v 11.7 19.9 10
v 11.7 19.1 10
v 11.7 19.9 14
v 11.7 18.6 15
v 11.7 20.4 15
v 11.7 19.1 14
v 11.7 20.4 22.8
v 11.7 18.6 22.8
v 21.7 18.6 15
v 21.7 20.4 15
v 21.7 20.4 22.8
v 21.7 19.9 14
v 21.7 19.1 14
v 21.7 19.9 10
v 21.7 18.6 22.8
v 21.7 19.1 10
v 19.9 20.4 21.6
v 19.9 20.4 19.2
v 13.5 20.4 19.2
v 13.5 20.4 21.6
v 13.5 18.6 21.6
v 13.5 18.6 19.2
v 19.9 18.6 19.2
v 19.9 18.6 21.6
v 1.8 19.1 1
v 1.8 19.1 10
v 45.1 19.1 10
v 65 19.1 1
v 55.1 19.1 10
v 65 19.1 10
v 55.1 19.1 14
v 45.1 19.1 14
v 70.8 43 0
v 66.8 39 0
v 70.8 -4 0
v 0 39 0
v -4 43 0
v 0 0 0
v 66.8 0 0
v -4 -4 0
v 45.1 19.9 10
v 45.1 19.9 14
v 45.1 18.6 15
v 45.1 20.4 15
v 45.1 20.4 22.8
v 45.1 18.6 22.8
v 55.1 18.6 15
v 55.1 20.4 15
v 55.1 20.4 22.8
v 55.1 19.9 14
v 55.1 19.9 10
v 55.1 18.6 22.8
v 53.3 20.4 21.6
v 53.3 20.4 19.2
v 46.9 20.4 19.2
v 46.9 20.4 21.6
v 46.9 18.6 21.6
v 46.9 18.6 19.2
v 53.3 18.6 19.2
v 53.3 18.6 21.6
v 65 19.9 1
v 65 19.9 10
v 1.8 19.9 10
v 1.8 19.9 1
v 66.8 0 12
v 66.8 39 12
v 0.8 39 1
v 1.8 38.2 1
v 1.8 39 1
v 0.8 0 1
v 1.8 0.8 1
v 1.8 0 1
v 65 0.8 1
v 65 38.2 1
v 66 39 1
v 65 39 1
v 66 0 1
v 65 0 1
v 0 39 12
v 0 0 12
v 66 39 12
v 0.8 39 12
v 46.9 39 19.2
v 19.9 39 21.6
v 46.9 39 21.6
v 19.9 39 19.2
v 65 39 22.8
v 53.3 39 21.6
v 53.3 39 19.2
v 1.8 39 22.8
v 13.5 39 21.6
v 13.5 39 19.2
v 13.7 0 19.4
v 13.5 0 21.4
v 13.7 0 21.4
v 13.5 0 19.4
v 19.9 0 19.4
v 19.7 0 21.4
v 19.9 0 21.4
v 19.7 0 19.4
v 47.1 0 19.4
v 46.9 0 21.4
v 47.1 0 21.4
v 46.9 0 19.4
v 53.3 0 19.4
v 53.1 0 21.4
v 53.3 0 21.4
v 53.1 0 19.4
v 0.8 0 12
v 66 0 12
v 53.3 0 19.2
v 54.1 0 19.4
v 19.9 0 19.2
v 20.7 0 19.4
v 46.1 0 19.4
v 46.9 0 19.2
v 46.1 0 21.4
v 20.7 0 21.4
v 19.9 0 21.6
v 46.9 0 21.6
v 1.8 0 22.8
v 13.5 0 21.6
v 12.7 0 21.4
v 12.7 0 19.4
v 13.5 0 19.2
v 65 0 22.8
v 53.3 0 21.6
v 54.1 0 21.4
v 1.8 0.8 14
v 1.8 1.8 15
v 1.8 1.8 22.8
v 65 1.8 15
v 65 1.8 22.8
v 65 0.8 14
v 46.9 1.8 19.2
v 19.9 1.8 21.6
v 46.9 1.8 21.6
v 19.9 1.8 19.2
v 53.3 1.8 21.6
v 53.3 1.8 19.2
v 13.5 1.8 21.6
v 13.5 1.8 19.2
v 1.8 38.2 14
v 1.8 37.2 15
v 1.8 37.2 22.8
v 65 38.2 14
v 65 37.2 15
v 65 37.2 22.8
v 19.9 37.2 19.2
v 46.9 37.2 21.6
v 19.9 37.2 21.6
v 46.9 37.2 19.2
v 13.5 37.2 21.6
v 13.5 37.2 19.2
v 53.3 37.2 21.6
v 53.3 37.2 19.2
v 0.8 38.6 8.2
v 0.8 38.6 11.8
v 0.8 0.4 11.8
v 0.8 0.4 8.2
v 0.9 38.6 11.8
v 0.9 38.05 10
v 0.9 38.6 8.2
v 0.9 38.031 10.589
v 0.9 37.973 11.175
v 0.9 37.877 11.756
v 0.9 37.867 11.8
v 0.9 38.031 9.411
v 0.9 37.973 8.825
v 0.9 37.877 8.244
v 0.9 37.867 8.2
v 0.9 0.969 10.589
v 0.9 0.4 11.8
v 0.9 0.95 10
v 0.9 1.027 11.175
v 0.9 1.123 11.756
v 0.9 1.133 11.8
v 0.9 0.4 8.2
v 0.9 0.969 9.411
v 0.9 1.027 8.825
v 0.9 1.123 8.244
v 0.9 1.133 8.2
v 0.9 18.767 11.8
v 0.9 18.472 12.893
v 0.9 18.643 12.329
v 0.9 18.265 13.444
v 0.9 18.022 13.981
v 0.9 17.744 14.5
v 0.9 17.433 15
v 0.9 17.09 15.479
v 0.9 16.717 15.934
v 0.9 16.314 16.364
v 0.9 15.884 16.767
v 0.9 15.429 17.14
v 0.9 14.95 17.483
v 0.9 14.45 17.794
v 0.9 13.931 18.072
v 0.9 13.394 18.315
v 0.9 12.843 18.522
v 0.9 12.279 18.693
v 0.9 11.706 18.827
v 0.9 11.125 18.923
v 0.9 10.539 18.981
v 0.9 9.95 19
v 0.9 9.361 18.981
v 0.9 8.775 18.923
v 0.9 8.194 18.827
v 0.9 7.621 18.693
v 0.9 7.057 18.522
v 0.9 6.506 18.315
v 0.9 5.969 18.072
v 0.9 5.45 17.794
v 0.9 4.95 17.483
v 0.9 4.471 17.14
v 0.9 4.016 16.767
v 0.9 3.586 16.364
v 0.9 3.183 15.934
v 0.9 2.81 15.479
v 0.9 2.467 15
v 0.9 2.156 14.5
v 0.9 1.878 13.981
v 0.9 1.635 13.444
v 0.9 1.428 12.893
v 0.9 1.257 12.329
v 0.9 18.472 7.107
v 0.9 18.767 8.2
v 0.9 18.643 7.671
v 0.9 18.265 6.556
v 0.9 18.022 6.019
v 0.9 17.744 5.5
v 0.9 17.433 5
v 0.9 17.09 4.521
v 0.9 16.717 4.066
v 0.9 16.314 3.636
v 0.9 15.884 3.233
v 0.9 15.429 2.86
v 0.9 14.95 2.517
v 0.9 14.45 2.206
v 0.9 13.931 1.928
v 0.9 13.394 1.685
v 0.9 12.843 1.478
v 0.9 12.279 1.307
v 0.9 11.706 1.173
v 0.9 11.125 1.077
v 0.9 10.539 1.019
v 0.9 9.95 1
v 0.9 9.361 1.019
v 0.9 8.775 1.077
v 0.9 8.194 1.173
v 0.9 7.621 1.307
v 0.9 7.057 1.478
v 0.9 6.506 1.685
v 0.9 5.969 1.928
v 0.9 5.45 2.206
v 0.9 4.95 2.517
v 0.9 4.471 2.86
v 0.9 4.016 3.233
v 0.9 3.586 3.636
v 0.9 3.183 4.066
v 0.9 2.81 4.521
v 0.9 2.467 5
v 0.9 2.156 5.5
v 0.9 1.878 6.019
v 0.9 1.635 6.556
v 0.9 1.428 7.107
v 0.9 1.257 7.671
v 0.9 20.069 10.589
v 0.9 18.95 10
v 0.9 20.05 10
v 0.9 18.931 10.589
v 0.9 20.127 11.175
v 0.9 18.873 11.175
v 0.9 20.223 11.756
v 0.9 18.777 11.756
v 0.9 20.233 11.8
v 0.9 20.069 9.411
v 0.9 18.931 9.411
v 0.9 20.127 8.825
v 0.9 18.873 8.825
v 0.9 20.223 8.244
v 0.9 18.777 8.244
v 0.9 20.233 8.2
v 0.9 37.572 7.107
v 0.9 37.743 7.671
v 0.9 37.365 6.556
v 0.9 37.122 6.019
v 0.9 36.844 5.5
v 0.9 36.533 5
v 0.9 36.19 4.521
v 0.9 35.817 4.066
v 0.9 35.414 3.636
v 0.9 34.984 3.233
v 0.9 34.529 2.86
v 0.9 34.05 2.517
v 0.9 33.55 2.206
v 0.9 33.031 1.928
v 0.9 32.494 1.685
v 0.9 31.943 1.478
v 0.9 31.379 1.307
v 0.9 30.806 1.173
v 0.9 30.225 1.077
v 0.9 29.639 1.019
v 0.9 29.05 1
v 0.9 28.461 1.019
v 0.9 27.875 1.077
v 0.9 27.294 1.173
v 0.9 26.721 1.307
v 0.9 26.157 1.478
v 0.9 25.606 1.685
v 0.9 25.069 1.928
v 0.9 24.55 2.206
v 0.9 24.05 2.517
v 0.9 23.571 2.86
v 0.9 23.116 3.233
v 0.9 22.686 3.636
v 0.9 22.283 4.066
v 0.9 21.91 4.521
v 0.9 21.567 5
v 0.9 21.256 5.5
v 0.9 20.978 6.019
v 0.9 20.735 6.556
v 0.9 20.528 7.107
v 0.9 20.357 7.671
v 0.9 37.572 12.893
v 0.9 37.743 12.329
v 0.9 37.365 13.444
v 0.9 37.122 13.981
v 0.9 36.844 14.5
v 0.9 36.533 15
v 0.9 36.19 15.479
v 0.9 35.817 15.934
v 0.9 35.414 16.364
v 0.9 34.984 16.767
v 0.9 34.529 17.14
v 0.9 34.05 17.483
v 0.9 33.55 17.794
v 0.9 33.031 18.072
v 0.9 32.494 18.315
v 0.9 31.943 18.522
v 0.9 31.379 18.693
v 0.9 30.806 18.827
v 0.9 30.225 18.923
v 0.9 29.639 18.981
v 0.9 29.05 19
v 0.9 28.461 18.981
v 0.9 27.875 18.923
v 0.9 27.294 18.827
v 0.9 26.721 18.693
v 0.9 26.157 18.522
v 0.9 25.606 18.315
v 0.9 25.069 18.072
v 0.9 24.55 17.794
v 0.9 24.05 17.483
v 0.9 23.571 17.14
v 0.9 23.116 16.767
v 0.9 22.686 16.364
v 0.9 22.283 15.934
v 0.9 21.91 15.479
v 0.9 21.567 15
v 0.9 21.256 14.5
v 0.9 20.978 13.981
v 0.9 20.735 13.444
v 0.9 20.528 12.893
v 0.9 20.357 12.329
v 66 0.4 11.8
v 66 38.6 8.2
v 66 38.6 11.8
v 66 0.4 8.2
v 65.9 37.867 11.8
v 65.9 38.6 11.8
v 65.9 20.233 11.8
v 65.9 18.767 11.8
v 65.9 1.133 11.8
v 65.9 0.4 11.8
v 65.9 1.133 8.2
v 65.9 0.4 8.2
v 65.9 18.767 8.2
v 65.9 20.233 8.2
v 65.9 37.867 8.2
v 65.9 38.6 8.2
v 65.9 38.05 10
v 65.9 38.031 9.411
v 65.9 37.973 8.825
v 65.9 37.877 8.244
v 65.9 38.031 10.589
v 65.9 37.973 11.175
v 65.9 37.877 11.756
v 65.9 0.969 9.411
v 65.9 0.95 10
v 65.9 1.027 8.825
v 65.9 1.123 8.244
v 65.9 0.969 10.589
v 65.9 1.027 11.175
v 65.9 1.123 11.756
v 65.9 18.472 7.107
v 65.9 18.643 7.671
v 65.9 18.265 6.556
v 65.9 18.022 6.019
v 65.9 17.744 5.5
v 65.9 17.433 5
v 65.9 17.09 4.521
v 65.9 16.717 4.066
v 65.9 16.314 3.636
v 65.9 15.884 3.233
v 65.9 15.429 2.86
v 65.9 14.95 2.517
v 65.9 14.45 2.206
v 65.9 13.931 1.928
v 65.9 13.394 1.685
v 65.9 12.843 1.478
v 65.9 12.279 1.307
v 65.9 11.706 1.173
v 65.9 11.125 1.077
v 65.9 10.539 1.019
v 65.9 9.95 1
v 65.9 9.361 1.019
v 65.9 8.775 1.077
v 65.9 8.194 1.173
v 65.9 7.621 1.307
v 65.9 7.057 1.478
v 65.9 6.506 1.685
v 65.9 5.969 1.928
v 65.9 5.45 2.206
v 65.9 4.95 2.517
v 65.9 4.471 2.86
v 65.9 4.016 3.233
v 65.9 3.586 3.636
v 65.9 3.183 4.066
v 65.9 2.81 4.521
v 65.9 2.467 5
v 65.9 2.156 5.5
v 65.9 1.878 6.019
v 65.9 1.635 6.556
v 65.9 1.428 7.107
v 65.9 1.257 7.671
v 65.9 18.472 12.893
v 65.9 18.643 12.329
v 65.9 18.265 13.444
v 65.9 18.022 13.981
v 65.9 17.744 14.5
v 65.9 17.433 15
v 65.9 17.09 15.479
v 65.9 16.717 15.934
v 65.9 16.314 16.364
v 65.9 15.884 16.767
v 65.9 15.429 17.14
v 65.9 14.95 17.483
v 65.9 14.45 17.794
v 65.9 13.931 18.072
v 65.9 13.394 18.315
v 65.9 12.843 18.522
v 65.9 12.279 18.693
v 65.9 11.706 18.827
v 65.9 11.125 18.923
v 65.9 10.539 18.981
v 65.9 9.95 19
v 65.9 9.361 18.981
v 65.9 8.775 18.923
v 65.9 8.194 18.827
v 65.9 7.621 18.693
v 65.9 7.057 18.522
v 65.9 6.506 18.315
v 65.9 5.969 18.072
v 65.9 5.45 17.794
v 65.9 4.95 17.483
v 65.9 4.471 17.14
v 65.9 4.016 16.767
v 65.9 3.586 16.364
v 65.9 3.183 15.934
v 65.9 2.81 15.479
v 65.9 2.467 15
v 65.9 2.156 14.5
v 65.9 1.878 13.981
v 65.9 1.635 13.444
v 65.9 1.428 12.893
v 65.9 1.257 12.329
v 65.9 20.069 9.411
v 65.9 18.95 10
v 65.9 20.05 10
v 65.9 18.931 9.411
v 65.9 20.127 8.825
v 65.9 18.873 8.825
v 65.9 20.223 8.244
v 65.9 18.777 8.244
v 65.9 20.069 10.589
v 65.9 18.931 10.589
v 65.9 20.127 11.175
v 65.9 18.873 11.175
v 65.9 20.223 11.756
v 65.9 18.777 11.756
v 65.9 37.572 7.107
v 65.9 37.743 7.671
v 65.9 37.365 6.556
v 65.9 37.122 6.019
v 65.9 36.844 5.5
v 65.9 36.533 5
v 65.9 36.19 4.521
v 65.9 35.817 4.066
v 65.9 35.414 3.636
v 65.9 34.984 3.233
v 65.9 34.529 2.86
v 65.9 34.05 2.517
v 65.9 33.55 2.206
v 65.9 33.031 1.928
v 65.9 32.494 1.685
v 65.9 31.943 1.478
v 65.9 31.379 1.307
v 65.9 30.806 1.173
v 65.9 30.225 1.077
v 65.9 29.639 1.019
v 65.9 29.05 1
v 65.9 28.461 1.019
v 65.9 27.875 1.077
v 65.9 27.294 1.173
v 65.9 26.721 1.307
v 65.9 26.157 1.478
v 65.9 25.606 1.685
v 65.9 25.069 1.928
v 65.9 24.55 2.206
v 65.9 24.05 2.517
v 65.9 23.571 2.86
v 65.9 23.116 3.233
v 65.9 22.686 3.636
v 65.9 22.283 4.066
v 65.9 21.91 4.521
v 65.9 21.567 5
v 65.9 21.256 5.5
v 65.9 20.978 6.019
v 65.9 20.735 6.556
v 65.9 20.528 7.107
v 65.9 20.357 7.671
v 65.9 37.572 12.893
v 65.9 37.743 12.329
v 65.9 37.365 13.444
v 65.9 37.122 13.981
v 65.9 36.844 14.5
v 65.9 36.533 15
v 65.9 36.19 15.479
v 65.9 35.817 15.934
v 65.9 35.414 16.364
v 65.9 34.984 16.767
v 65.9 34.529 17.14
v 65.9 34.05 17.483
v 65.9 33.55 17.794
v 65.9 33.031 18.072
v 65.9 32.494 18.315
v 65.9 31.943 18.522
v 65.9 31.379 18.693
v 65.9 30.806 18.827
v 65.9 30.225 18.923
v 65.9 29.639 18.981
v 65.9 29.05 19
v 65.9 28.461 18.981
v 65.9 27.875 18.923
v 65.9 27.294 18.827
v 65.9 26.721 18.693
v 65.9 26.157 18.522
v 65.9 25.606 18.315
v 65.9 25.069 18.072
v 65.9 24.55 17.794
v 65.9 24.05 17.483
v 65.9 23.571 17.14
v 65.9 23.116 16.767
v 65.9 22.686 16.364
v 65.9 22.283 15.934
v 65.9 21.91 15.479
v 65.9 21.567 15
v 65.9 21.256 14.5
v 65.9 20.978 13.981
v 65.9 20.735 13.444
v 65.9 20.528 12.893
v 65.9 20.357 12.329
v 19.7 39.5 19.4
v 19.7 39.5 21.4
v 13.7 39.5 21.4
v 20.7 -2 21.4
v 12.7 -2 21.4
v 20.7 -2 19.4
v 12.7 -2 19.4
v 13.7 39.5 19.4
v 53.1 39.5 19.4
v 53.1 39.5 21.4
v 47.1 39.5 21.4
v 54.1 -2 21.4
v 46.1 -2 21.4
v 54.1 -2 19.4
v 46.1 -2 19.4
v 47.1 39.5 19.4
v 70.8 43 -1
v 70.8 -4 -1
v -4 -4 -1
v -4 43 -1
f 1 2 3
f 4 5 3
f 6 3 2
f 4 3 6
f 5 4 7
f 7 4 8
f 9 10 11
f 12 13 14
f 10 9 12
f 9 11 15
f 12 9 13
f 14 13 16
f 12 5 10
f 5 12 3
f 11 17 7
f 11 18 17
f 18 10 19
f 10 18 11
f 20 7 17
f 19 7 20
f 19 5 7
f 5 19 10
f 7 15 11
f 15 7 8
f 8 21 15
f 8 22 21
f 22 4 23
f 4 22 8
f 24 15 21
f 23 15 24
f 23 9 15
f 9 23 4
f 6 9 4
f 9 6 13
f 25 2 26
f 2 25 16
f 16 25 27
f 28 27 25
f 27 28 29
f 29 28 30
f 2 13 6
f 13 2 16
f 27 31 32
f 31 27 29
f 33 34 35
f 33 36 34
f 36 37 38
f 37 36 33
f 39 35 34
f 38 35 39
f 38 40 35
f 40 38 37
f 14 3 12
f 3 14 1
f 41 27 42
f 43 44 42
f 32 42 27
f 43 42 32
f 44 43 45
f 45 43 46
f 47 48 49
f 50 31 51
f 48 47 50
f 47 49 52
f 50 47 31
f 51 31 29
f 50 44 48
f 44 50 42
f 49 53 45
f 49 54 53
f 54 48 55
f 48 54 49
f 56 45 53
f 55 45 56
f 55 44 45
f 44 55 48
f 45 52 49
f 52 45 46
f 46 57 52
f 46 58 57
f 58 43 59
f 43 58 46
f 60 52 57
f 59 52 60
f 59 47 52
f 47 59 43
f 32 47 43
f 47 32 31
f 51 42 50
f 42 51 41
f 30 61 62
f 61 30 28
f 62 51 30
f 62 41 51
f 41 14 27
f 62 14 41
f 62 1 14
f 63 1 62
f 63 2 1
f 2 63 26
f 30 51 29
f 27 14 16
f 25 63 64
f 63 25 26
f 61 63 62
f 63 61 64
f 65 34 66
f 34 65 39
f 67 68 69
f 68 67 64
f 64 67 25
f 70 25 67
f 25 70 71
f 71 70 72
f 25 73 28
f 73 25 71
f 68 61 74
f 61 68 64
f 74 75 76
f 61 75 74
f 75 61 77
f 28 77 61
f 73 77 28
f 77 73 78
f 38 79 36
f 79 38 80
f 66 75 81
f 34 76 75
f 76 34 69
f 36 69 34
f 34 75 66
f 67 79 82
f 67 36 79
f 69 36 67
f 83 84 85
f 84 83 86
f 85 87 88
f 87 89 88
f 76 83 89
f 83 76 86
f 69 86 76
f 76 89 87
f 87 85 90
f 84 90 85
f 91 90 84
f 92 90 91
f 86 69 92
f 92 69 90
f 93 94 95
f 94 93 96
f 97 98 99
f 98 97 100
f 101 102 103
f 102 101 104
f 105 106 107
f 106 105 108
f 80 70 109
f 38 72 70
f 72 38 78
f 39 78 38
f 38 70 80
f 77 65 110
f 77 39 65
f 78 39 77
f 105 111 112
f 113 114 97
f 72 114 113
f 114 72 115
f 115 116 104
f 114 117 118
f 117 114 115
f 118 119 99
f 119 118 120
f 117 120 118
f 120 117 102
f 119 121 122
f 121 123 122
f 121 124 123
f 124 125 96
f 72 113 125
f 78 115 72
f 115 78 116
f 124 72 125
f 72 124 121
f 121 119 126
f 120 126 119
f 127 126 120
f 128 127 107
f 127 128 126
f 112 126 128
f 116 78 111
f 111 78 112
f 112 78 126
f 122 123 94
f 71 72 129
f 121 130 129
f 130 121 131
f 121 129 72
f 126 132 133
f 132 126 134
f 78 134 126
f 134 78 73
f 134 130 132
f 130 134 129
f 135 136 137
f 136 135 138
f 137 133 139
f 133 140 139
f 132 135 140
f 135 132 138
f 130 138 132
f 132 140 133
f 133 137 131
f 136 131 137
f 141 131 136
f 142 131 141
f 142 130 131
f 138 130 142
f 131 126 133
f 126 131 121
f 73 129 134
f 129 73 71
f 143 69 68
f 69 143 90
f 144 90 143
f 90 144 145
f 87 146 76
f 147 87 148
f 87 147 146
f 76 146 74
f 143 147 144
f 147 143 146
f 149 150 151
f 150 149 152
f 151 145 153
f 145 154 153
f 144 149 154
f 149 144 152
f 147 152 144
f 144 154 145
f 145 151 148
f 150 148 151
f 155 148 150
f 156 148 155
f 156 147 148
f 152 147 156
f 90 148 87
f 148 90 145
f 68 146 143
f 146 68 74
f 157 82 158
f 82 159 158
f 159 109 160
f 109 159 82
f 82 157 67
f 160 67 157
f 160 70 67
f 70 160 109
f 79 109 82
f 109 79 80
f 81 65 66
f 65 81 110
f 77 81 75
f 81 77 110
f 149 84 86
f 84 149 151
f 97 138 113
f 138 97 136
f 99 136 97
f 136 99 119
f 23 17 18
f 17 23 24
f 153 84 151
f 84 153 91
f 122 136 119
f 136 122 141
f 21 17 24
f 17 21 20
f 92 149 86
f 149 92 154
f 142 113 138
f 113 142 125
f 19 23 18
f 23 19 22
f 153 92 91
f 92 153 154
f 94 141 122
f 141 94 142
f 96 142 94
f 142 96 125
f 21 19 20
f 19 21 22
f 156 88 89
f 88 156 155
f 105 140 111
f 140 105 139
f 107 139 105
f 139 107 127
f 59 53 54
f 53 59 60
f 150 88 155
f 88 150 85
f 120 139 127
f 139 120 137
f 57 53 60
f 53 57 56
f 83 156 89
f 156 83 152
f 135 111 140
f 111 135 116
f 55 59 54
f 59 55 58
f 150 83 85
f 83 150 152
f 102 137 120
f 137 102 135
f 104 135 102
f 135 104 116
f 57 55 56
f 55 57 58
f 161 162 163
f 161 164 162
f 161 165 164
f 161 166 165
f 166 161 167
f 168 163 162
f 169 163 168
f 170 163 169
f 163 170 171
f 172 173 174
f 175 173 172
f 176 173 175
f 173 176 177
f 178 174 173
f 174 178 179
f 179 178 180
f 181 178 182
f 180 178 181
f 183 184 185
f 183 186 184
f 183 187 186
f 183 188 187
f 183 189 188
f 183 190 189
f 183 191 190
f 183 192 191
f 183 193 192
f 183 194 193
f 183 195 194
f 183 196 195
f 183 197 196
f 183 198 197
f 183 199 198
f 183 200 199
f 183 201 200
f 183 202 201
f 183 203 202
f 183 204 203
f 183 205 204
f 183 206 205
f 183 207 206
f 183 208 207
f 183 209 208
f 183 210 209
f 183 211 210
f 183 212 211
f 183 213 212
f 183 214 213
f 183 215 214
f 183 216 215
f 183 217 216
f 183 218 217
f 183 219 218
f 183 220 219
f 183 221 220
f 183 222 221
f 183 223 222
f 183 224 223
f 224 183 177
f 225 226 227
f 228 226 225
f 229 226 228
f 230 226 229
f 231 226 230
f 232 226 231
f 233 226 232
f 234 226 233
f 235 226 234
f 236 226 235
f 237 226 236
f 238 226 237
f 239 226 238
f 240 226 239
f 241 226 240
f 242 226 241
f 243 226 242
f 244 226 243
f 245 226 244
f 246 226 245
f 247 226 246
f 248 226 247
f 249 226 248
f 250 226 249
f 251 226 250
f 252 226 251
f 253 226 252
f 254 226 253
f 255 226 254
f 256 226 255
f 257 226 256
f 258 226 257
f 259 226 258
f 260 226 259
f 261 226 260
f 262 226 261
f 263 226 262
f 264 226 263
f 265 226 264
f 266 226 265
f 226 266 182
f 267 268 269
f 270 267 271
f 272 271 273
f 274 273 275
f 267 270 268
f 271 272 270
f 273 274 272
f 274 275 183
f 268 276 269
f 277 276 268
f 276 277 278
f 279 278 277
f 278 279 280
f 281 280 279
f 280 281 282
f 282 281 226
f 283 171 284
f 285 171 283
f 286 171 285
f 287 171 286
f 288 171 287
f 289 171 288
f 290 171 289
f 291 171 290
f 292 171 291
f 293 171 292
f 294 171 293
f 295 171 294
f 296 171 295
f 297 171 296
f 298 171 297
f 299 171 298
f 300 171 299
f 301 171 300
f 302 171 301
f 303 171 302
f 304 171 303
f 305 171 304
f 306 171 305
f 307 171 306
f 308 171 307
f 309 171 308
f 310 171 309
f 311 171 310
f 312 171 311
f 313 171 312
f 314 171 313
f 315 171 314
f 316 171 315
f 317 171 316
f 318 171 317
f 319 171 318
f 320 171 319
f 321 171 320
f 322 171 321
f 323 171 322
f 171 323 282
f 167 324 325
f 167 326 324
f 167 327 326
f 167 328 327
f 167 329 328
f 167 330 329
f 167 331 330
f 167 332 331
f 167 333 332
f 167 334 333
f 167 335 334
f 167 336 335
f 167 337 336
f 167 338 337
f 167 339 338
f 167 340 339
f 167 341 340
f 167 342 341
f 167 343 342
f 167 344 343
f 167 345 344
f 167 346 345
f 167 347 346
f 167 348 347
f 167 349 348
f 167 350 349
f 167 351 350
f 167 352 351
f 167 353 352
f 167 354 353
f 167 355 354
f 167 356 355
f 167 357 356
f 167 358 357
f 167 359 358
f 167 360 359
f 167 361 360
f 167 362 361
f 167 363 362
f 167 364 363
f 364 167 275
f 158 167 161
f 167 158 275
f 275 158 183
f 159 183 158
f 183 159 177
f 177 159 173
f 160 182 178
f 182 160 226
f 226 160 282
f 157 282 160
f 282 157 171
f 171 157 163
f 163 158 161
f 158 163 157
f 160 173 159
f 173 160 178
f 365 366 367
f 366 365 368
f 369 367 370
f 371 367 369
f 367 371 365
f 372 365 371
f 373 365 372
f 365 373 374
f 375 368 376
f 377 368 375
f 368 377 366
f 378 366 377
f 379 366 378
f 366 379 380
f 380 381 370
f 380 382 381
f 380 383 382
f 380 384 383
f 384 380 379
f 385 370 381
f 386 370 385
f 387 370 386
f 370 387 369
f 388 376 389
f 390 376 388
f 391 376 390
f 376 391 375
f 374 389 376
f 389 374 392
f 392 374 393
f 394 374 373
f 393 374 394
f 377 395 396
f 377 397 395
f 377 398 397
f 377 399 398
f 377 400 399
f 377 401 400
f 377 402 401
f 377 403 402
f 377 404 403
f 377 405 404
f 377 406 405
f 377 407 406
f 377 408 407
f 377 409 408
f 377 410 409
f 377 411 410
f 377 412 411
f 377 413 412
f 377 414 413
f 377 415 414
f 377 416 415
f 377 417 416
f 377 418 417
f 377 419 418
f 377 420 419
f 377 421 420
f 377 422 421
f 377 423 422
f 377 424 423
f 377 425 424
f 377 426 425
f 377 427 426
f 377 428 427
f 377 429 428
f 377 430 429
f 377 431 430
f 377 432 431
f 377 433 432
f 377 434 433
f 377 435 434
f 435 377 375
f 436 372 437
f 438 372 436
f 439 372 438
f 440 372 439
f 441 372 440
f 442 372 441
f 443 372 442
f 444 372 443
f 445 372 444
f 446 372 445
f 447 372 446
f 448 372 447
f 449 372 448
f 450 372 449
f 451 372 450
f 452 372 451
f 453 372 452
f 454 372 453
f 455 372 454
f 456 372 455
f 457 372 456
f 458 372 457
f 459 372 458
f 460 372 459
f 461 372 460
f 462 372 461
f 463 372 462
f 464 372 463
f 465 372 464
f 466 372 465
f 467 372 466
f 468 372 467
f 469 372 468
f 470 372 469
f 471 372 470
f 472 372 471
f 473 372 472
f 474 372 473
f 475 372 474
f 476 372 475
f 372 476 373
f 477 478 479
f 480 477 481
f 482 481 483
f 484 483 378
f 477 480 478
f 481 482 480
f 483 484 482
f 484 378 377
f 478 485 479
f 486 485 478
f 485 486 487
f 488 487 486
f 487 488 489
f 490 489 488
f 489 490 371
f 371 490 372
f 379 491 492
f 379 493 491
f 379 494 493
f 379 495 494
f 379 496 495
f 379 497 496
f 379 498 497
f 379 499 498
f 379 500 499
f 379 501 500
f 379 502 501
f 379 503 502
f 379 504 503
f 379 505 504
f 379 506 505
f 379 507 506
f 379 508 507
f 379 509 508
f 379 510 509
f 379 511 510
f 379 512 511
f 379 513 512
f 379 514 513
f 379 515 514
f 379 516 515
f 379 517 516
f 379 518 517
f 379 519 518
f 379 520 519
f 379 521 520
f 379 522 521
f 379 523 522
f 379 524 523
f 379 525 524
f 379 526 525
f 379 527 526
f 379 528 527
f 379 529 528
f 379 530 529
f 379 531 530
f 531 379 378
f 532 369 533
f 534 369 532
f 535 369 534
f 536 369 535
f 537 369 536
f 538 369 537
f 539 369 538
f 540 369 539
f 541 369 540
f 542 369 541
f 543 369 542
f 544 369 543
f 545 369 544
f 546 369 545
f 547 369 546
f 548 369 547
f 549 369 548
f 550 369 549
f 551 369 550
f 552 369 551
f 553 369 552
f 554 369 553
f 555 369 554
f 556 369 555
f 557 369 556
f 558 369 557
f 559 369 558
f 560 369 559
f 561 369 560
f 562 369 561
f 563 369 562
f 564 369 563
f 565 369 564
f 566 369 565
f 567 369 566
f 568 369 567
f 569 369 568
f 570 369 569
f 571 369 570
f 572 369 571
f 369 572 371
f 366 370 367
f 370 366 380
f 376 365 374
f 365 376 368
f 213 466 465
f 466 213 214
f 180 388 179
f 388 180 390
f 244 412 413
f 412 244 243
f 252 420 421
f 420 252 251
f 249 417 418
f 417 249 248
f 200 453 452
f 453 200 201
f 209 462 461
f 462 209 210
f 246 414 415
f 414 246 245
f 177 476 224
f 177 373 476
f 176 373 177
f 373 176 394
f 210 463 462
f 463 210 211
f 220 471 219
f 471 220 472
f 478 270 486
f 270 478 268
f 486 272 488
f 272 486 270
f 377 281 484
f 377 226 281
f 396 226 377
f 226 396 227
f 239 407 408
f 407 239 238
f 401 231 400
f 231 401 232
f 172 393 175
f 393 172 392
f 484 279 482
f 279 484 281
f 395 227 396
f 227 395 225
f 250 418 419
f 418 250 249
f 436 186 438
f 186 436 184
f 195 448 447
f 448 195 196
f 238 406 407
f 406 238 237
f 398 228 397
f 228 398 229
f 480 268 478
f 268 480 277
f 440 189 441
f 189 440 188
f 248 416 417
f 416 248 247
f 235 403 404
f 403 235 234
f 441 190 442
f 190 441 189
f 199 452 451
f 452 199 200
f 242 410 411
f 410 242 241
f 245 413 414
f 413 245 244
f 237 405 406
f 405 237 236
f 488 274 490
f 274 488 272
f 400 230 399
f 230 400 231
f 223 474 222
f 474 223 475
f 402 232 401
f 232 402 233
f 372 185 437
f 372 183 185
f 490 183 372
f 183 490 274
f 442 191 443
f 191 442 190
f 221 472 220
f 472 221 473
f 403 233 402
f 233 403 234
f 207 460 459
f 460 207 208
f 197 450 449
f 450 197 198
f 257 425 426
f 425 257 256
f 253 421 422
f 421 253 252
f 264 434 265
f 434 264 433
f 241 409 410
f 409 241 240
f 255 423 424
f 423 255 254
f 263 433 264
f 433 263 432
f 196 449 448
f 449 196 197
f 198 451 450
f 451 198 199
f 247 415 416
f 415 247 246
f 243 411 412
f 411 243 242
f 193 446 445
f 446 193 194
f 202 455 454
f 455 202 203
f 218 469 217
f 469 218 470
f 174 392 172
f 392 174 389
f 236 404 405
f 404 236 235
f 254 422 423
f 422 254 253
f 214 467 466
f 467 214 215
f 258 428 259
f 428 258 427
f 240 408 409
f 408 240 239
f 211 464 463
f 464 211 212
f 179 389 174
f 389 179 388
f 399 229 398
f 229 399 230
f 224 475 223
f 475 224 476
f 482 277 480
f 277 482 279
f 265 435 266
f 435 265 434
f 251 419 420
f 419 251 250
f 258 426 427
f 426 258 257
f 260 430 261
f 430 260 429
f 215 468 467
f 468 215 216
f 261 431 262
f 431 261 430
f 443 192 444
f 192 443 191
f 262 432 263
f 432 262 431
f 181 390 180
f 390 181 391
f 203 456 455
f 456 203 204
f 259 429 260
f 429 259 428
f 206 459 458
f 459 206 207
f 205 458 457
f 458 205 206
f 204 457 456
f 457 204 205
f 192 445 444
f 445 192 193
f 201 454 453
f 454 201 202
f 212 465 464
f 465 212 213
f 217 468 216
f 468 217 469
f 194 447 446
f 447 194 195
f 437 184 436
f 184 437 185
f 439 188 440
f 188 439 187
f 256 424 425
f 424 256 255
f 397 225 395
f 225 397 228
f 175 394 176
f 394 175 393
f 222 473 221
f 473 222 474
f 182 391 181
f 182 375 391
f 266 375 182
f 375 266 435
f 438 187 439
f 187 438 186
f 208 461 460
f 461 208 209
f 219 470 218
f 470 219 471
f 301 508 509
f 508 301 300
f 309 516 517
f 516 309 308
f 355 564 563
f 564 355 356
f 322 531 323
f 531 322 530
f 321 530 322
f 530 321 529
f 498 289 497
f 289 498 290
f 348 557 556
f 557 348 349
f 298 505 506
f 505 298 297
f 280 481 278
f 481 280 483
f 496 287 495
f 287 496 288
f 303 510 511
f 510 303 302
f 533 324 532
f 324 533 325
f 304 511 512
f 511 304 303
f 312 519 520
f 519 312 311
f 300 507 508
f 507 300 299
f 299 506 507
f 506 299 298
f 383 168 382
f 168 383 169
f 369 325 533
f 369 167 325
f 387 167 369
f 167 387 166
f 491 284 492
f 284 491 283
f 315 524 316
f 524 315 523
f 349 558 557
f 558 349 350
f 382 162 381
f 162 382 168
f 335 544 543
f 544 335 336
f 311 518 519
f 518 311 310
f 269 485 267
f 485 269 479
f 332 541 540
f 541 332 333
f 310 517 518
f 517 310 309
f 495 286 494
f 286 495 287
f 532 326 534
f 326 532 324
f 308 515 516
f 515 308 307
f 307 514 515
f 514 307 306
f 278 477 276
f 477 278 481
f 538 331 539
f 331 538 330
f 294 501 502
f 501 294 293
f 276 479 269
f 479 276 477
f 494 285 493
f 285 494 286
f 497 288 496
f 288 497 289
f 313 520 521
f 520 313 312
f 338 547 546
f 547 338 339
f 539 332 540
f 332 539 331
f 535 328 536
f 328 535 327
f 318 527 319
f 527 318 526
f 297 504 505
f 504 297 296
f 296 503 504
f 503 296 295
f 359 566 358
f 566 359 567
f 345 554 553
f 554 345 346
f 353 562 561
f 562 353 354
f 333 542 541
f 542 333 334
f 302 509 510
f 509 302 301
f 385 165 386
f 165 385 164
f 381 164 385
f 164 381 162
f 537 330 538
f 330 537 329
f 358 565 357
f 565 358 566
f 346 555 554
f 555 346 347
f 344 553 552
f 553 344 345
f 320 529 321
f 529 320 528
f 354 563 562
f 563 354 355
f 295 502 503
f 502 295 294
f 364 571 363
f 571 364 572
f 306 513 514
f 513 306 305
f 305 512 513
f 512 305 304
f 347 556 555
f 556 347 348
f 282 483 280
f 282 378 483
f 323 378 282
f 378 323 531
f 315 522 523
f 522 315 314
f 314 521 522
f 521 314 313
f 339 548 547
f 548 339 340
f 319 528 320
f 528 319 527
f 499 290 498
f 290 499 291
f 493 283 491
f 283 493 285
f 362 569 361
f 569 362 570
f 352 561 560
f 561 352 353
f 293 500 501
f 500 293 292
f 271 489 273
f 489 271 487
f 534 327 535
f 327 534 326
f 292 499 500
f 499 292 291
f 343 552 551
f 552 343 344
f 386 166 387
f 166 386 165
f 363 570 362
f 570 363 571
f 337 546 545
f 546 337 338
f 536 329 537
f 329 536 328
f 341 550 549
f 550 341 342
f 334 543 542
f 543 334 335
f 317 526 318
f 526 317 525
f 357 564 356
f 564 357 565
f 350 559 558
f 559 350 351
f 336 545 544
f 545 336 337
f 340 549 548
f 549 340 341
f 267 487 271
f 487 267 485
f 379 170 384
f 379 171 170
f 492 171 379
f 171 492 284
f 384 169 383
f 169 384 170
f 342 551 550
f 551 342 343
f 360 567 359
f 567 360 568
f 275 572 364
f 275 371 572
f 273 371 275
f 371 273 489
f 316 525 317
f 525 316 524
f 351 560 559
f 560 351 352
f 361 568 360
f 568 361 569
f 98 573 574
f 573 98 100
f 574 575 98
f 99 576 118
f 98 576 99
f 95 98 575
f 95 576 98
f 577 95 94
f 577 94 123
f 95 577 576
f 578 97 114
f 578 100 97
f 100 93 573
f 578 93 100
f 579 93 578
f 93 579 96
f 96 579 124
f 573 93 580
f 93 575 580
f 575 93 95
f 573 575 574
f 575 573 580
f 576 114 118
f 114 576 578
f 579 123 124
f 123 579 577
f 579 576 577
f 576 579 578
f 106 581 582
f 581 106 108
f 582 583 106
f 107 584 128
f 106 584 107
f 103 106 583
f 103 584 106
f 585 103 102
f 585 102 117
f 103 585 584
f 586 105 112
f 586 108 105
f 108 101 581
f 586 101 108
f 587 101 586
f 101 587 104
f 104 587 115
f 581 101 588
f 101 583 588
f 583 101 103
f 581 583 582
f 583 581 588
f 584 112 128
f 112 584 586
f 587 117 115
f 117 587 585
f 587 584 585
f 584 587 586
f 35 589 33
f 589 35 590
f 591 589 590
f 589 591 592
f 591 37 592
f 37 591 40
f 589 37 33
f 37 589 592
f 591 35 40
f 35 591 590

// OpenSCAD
// Visual concept for discussion, NOT a qualified replacement print file.
// Taller walls carry rigid bars through slots above the cells.
// A bar stop/lock and actual removal access remain to be decided.
cells = 2;
view = "assembled"; // assembled, withdrawn, empty, interference
$fn = 96;
length = 66.8;
width = 19.9 + (cells-1)*19.1;
height = 22.8;
bar_centres = [length/4,3*length/4];
withdrawal = width+4;

assert(cells>=1 && cells<=3 && floor(cells)==cells);

// Wall grows inward above the cell shoulder, strengthening the slot surround
// without increasing the tray footprint. Both end contact walls stay separate.
module outer_wall(right=false) {
    module left_wall() {
        translate([1.8,0,0]) rotate([90,0,90]) linear_extrude(length-3.6)
            polygon([[0,0],[0.8,0],[0.8,14],[1.8,15],[1.8,height],[0,height]]);
    }
    if(right) translate([0,width,0]) mirror([0,1,0]) left_wall();
    else left_wall();
}

module contact_wall(right=false) {
    // Seated 0.8 mm contact wall, matching the current contact-fit envelope.
    translate([right ? length-0.8 : 0,0,0]) cube([0.8,width,12]);
}

module tray() {
    difference() {
        union() {
            cube([length,width,1]);
            outer_wall(); outer_wall(true);
            contact_wall(); contact_wall(true);
            if(cells>1) for(i=[1:cells-1]) {
                y=0.8+i*18.3+(i-1)*0.8;
                translate([1.8,y,0]) cube([length-3.6,0.8,10]);
                // Local supports at each bar limit its unsupported span to
                // one cell, rather than the full multi-cell holder width.
                for(x=bar_centres)
                    translate([x-5,y,0]) rotate([90,0,90]) linear_extrude(10)
                        polygon([[0,0],[0.8,0],[0.8,14],[1.3,15],
                                 [1.3,height],[-0.5,height],[-0.5,15],[0,14]]);
            }
        }
        for(x=bar_centres) translate([x-3.2,-0.01,19.2])
            cube([6.4,width+0.02,2.4]);
    }
}

module bar(x, distance=0) {
    translate([x,-distance,19.4]) union() {
        translate([-3,-0.2,0]) cube([6,width+0.7,2]);
        // Outside pull head also stops over-insertion. No locking detent yet.
        translate([-4,-2,0]) cube([8,2,2]);
    }
}

module cell_envelopes(lift=0) {
    // 65 mm = original reported 64 mm + the retained 1 mm print-fit allowance.
    for(i=[0:cells-1]) translate([0.9,9.95+i*19.1,10+lift])
        rotate([0,90,0]) cylinder(d=18,h=65);
}

module copper() {
    for(x=[0.8,length-0.9]) translate([x,0.4,8.2]) cube([0.1,width-0.8,3.6]);
}

module board() {
    translate([-4,-4,-1]) cube([length+8,width+8,1]);
}

if(view=="interference") intersection() {
    tray(); union() { cell_envelopes(); for(x=bar_centres) bar(x); }
}
else {
    color([0.68,0.72,0.70]) board();
    color("SteelBlue") tray();
    color("DarkOrange") copper();
    if(view!="empty") color([0.27,0.29,0.32])
        cell_envelopes(view=="withdrawn" ? 16 : 0);
    for(x=bar_centres) color([0.95,0.54,0.1])
        bar(x,view=="withdrawn" ? withdrawal : 0);
}
